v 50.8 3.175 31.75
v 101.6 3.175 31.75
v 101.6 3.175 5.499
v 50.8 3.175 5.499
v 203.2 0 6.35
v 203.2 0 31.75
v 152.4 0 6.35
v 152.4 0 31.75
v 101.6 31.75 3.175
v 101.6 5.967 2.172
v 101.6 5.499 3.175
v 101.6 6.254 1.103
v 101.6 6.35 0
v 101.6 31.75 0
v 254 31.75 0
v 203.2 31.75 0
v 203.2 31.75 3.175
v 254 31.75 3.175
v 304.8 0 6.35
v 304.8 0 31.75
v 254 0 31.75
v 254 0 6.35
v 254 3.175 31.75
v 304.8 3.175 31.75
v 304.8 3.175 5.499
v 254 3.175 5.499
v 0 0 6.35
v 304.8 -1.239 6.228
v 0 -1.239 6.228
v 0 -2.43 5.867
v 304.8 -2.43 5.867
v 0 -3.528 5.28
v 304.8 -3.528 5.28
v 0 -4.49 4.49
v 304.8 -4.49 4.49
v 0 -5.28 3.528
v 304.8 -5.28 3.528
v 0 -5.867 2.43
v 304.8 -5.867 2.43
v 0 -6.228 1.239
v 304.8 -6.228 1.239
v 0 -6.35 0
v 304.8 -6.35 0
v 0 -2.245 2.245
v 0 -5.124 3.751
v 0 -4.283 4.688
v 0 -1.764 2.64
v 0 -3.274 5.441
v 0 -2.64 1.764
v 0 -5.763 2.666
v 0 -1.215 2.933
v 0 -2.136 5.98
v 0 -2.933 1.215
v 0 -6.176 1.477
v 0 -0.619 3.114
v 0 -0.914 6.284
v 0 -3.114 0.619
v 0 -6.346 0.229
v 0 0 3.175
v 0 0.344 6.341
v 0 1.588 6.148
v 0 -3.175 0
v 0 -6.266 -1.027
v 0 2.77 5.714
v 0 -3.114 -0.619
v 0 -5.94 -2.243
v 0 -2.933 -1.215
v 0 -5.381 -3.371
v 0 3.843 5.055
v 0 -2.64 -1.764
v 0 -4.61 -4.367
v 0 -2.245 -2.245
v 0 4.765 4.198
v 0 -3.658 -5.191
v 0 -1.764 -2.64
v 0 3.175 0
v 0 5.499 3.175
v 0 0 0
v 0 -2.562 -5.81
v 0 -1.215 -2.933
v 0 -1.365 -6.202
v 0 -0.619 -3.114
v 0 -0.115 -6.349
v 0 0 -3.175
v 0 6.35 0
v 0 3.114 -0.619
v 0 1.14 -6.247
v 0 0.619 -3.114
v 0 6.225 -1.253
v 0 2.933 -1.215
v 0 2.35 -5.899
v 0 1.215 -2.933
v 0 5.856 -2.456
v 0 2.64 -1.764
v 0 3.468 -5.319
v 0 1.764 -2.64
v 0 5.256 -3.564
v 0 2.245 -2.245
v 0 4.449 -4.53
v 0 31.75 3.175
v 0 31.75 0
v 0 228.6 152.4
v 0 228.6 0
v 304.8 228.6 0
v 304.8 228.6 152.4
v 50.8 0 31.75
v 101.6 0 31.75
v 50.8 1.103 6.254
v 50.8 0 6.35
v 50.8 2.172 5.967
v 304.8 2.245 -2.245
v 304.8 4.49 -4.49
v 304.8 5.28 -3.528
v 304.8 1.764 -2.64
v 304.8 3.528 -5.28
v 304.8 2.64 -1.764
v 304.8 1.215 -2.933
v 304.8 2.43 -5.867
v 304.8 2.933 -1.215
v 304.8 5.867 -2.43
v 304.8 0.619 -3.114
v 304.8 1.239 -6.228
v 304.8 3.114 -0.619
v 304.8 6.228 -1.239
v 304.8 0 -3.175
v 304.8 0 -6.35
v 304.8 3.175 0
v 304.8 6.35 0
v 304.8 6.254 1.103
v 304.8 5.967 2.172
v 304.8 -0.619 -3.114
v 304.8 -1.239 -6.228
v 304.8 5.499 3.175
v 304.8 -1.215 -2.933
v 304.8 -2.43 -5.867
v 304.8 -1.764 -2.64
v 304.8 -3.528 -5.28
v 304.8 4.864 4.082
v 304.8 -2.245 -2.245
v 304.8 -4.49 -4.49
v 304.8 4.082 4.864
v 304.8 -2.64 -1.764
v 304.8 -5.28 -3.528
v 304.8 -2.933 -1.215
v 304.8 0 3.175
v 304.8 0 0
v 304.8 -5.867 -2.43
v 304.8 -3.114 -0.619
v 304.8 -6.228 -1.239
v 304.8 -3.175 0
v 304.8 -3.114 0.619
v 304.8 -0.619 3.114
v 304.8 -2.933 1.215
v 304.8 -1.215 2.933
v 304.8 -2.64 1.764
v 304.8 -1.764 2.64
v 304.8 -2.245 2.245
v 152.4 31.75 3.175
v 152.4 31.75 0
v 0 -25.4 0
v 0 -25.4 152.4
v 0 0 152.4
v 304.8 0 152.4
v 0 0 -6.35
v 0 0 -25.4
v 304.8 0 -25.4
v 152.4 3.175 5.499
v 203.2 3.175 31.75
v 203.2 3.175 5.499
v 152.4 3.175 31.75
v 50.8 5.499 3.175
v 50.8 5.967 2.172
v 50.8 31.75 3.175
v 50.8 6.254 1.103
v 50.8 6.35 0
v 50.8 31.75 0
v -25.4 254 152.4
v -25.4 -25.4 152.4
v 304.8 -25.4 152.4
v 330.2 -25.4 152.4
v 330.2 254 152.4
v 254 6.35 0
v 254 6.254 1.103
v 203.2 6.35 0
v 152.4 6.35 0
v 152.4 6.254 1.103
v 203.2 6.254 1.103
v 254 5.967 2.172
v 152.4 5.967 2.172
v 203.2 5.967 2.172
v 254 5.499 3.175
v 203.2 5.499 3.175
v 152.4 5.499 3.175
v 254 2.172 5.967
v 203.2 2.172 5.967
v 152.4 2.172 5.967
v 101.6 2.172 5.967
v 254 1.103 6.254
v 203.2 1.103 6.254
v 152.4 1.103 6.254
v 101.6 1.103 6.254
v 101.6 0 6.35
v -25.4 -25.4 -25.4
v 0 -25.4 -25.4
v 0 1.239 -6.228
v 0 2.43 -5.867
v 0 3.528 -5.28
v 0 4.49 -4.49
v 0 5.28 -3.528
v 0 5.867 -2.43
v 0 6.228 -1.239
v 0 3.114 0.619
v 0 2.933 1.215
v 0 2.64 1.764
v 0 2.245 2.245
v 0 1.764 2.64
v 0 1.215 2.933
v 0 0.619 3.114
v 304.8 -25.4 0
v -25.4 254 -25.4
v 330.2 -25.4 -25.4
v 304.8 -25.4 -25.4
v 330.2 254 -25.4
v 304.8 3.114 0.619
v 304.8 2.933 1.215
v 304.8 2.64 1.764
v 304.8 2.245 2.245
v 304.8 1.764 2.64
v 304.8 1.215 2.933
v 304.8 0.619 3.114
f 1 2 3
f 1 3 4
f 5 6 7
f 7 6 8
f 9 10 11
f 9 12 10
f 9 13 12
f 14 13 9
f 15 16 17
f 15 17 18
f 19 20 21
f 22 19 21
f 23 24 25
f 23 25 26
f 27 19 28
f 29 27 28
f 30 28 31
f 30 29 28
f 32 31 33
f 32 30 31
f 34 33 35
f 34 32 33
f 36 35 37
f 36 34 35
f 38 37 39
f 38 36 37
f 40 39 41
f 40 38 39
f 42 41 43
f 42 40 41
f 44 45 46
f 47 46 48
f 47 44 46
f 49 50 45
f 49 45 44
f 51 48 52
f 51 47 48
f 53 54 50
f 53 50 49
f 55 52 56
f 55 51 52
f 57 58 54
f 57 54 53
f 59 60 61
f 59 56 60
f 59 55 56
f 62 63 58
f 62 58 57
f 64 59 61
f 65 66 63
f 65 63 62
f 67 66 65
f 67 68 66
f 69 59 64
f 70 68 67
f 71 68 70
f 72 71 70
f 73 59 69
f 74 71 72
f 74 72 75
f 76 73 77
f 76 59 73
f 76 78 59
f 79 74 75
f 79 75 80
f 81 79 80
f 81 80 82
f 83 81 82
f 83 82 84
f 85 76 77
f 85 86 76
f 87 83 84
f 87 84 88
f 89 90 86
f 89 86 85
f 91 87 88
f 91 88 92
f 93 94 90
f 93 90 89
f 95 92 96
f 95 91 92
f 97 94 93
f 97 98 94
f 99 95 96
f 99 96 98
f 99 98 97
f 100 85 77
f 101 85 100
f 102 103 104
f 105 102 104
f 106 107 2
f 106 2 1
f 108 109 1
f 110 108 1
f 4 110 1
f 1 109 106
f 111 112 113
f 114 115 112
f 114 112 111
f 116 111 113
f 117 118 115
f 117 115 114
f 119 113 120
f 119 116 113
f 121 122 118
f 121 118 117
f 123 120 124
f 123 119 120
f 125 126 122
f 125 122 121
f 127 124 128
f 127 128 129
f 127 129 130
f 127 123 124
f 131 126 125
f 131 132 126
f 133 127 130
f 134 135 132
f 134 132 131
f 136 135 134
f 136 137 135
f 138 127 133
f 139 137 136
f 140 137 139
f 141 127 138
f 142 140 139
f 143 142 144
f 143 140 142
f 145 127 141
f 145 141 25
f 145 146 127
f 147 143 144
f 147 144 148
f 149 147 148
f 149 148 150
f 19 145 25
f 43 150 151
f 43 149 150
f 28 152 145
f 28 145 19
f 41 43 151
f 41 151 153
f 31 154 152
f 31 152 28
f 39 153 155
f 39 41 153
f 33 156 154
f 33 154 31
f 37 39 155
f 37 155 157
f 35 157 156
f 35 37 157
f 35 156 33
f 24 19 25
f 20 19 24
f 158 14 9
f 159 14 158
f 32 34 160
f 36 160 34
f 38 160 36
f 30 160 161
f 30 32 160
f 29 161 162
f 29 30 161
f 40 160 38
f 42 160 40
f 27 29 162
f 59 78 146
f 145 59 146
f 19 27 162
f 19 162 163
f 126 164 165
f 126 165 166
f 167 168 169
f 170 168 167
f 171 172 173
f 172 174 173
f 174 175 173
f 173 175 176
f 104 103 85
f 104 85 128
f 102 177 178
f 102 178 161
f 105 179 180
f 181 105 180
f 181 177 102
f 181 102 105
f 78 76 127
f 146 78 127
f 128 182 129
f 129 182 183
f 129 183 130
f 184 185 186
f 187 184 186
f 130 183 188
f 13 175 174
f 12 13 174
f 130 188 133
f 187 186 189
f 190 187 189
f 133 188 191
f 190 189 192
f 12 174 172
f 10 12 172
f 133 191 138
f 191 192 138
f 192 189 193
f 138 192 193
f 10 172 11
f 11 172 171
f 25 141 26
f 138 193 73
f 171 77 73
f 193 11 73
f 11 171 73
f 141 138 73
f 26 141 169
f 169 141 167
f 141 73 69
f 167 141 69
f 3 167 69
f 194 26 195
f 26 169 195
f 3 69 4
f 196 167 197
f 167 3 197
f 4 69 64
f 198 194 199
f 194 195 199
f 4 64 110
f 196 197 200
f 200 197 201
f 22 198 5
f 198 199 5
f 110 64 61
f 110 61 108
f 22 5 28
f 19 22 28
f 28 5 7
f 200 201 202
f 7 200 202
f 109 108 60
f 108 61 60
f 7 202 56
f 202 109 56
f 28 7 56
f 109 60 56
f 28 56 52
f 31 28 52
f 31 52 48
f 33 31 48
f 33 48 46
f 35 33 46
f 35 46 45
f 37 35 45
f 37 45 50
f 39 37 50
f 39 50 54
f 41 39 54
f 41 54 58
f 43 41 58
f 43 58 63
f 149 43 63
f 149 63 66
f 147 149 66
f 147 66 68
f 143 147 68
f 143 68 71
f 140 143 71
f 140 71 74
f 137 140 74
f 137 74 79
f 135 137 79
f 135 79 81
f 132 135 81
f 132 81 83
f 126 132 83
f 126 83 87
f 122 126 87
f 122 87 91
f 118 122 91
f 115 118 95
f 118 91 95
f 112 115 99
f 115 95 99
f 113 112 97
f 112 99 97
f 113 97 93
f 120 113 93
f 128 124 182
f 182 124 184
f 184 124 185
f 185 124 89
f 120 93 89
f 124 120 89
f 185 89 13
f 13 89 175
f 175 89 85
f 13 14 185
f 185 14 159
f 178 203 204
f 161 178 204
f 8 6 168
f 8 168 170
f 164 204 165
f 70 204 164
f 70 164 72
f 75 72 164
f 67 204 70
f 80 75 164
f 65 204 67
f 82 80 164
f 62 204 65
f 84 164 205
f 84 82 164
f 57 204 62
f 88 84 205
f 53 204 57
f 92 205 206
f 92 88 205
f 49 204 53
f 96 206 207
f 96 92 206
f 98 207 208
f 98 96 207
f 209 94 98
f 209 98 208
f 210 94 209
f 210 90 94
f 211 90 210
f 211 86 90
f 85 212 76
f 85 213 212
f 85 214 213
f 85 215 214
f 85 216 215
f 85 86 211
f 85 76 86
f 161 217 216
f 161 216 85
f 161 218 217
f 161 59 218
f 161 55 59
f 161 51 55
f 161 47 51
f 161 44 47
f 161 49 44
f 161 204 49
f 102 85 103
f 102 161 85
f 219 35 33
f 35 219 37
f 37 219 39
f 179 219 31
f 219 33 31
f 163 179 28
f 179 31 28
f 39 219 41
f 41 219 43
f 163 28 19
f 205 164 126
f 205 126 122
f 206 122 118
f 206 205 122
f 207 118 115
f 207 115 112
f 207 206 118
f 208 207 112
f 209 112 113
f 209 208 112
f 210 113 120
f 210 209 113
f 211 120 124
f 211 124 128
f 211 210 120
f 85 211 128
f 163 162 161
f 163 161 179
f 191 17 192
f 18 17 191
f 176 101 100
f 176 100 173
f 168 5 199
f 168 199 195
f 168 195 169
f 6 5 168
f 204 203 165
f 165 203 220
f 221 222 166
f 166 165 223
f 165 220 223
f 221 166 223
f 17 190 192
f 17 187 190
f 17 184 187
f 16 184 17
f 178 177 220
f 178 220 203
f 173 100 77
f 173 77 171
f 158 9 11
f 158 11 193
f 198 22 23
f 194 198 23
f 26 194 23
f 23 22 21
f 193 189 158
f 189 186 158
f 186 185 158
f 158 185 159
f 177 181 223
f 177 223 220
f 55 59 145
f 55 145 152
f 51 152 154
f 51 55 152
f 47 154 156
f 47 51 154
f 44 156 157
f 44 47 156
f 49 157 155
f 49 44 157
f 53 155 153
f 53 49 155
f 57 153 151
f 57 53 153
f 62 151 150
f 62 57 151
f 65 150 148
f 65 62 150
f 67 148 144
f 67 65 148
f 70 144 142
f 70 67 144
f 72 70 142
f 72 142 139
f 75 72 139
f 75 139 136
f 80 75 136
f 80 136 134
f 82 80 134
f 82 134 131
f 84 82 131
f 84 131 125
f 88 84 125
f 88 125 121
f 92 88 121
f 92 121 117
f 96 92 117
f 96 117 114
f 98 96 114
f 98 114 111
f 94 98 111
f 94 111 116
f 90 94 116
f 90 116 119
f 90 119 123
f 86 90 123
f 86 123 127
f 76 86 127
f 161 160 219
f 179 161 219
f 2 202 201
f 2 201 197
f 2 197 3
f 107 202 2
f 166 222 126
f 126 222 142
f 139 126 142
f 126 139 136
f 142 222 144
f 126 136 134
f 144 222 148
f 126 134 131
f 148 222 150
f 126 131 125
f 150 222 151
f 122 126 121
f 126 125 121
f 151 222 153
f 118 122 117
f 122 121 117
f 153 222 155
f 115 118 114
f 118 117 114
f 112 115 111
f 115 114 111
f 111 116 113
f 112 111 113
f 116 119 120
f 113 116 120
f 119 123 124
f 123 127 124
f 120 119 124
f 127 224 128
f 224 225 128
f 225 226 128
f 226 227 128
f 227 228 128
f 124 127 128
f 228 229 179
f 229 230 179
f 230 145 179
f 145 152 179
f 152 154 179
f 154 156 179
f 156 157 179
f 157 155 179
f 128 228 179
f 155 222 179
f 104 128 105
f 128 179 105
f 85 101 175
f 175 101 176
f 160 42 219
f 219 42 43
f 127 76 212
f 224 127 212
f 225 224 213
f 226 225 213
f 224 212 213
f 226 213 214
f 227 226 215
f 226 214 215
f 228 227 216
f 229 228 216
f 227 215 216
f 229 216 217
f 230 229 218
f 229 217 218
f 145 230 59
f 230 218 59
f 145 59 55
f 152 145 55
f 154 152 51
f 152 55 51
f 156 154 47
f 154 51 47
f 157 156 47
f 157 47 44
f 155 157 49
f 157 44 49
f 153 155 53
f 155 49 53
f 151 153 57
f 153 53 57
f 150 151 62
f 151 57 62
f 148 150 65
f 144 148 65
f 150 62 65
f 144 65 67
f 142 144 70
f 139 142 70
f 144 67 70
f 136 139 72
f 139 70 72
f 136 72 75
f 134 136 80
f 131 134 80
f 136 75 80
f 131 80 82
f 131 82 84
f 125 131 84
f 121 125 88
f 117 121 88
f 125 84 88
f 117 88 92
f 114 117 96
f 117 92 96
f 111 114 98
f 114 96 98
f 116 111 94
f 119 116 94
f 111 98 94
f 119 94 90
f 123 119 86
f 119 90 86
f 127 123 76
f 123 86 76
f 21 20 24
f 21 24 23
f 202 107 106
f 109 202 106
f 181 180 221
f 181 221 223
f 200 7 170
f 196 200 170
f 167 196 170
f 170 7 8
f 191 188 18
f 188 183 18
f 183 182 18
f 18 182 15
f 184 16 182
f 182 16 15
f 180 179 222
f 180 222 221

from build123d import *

# Parameters (mm, degrees)
F0_W          = 304.8
F0_H          = 228.6
F1_DEPTH      = 25.4
F2_DEPTH      = 152.4
F2_DEPTH_BACK = 25.4
F0_H_2        = 25.4
F3_DEPTH      = 152.4
F4_R          = 6.35
F4_R_2        = 3.175
F5_DEPTH      = 304.8
F6_DEPTH      = 304.8
F7_DEPTH      = 304.8
F8_W          = 50.8
F8_H          = 31.75
F10_DEPTH     = 3.175
F9_W          = 50.8
F9_H          = 31.75
F9_W_2        = 50.8000000005
F11_DEPTH     = 3.175


with BuildPart() as f1:
    # F0 (on Top) → F1 (new body)
    with BuildSketch(Plane.XY):
        with Locations((152.4, 114.3)):
            Rectangle(F0_W, F0_H)
    extrude(amount=-F1_DEPTH)

    # F0 (on Top) → F2 (join, two sides)
    with BuildSketch(Plane.XY) as f2_sk:
        Polygon((0, -25.4), (0, 0), (0, 228.6), (304.8, 228.6), (304.8, 0), (304.8, -25.4), (330.2, -25.4), (330.2, 254), (-25.4, 254), (-25.4, -25.4), align=None)
    extrude(amount=F2_DEPTH)
    extrude(f2_sk.sketch, amount=-F2_DEPTH_BACK)


with BuildPart() as f3:
    # F0 (on Top) → F3 (new body)
    with BuildSketch(Plane.XY):
        with Locations((152.4, -12.7)):
            Rectangle(F0_W, F0_H_2)
    extrude(amount=F3_DEPTH)


with BuildPart() as f5_tool:
    # F4 (on Right) → F5 (new body, through all)
    with BuildSketch(Plane.YZ):
        Circle(F4_R)
        Circle(F4_R_2, mode=Mode.SUBTRACT)
        Circle(F4_R_2)
    extrude(amount=F5_DEPTH)


with BuildPart() as f1_1:
    add(f1.part)

    # F5: cut by f5_tool
    add(f5_tool.part, mode=Mode.SUBTRACT)

    # F4 (on Right) → F6 (join, through all)
    with BuildSketch(Plane.YZ):
        Circle(F4_R_2)
    extrude(amount=F6_DEPTH)


with BuildPart() as f3_1:
    add(f3.part)

    # F5: cut by f5_tool
    add(f5_tool.part, mode=Mode.SUBTRACT)


with BuildPart() as f7:
    # F4 (on Right) → F7 (new body, through all)
    with BuildSketch(Plane.YZ):
        Circle(F4_R)
        Circle(F4_R_2, mode=Mode.SUBTRACT)
    extrude(amount=F7_DEPTH)

    # F8 (on face) → F10 (join)
    with BuildSketch(Plane(origin=(0, 0, 0), x_dir=(-1, 0, 0), z_dir=(0, 1, 0))):
        with Locations((-279.4, 15.875)):
            Rectangle(F8_W, F8_H)
        with Locations((-177.8, 15.875)):
            Rectangle(F8_W, F8_H)
        with Locations((-76.2, 15.875)):
            Rectangle(F8_W, F8_H)
    extrude(amount=F10_DEPTH)

    # F9 (on face) → F11 (join)
    with BuildSketch(Plane.XY):
        with Locations((25.4, 15.875)):
            Rectangle(F9_W, F9_H)
        with Locations((127.0000000002, 15.875)):
            Rectangle(F9_W_2, F9_H)
        with Locations((228.6, 15.875)):
            Rectangle(F9_W, F9_H)
    extrude(amount=F11_DEPTH)


solid = Compound([f1_1.part, f3_1.part, f7.part])
